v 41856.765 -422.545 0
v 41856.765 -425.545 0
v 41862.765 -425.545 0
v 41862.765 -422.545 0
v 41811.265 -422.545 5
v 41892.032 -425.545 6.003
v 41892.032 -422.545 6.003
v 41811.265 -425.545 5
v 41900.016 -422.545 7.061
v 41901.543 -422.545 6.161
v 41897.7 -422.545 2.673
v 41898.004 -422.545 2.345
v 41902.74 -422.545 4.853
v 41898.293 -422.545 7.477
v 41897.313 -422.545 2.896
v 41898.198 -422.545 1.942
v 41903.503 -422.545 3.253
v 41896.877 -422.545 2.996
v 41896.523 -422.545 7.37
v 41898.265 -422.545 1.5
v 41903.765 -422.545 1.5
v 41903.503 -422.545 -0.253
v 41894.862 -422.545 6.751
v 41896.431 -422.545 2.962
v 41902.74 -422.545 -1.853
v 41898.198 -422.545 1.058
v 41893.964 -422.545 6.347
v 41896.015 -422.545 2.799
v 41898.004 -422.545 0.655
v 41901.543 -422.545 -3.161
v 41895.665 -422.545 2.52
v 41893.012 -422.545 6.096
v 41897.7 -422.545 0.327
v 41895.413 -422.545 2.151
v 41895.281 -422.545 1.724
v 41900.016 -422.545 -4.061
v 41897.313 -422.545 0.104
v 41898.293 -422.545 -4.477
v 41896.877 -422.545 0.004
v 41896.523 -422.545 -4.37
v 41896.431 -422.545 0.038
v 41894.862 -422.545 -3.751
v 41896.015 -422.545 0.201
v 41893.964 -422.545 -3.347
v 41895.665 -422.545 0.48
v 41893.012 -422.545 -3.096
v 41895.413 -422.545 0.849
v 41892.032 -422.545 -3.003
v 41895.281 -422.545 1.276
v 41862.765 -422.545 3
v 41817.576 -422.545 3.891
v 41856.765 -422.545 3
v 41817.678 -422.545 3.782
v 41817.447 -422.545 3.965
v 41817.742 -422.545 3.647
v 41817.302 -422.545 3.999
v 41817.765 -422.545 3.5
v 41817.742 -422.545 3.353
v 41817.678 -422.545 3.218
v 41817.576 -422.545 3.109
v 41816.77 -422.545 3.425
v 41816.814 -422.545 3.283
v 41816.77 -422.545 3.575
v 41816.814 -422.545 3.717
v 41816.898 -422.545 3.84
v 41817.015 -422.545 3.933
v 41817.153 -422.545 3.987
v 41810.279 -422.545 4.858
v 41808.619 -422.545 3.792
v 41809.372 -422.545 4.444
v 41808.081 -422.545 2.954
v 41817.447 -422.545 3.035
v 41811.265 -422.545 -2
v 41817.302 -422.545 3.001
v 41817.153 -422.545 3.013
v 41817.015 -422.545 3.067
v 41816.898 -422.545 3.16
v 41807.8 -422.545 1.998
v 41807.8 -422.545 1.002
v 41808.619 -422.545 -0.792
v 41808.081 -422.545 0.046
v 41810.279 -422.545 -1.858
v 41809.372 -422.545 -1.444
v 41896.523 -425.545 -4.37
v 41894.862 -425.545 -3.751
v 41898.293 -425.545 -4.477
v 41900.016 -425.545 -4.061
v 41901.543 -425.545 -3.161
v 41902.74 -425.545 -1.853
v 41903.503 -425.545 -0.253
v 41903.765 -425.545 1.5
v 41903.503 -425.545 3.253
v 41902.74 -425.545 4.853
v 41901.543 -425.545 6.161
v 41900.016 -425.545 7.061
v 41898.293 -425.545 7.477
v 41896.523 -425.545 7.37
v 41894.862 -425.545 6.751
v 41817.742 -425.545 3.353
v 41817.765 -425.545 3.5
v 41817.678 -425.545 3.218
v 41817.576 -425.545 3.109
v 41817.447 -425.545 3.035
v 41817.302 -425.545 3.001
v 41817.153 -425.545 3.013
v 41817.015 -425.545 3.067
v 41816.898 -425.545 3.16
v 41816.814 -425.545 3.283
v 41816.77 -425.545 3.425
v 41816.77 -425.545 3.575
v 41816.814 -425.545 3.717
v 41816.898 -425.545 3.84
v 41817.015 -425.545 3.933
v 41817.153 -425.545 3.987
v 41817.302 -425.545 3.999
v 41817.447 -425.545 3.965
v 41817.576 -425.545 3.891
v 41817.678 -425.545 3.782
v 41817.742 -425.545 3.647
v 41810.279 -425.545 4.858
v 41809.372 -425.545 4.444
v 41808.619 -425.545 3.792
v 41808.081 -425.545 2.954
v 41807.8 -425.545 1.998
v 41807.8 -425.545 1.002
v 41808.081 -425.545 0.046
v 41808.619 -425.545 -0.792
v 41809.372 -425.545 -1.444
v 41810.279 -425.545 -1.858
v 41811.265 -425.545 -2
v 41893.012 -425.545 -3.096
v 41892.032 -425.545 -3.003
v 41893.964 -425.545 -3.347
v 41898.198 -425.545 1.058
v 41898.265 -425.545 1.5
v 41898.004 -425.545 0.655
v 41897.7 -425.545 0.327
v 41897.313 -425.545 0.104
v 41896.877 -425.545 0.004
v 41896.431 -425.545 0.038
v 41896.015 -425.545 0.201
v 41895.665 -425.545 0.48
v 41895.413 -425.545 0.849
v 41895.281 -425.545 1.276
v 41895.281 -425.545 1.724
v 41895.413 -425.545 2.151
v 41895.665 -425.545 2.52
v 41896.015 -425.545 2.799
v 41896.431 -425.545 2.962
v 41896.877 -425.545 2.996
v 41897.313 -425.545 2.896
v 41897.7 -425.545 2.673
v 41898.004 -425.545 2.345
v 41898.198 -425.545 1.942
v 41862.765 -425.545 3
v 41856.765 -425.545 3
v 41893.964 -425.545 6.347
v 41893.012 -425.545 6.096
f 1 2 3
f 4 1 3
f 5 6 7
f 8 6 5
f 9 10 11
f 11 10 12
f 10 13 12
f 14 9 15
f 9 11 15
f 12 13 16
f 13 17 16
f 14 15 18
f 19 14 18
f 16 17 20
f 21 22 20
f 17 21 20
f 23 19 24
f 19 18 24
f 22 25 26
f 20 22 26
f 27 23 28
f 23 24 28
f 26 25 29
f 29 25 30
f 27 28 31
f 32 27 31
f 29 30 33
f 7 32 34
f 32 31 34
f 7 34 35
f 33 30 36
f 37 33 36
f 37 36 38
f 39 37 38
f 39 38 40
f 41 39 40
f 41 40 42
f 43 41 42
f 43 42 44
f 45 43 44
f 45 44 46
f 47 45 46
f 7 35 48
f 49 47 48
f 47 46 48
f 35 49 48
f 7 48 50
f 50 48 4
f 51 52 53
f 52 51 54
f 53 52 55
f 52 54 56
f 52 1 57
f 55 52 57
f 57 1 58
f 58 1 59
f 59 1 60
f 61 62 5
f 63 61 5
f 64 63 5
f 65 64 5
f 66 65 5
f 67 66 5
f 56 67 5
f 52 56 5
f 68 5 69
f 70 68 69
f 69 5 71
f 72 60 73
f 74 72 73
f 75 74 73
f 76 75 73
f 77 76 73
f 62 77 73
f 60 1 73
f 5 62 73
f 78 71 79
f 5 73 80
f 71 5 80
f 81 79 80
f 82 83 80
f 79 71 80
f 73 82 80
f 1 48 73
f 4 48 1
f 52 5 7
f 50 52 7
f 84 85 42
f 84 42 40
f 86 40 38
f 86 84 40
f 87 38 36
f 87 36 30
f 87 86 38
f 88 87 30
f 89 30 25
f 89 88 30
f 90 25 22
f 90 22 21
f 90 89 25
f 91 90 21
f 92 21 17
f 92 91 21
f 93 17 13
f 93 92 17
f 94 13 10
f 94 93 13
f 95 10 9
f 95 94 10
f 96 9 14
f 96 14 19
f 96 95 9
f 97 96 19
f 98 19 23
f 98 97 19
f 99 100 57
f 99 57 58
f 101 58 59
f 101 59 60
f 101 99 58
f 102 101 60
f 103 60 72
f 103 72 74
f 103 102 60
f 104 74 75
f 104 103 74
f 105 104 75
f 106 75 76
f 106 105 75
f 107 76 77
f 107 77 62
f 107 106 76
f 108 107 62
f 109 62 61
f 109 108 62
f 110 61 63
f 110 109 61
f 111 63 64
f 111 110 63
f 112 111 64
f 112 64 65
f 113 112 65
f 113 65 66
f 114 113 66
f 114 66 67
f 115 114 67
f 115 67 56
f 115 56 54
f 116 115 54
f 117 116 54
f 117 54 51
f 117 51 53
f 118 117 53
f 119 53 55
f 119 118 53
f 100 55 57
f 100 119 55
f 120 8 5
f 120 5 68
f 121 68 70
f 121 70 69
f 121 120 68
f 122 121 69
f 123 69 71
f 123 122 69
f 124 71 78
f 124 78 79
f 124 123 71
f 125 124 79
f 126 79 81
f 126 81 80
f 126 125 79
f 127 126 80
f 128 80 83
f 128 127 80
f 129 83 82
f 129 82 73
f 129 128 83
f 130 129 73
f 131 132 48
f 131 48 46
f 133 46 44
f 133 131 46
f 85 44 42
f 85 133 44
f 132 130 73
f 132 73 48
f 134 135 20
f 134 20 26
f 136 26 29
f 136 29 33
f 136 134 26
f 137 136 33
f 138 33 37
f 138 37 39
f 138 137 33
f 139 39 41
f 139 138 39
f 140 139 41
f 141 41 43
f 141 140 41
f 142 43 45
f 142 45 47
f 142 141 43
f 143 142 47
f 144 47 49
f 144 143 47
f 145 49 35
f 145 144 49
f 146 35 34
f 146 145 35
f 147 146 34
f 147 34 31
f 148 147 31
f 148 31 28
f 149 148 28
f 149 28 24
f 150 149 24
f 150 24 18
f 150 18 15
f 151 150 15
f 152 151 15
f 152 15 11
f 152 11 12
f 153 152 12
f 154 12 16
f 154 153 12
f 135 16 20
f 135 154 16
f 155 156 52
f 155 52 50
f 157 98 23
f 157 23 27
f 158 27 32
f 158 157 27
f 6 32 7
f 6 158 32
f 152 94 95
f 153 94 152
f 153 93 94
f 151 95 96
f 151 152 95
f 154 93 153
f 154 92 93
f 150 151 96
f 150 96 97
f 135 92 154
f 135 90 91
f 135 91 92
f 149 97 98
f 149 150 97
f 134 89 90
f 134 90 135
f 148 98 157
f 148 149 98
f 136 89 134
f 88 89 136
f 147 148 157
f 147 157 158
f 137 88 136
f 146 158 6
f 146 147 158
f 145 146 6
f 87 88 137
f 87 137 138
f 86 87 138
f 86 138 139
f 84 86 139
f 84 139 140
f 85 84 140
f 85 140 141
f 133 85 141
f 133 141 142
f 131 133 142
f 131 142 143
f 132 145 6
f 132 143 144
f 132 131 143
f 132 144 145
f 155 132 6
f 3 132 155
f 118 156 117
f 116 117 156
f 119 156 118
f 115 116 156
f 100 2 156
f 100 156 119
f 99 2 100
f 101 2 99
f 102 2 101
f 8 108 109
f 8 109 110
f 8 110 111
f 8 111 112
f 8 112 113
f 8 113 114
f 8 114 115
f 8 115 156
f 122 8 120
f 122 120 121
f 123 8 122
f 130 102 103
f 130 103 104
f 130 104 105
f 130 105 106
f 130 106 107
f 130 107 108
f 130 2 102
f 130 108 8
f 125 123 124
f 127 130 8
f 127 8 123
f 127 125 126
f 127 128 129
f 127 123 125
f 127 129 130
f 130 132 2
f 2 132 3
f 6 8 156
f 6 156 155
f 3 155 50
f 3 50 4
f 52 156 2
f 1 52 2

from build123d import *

# Parameters (mm, degrees)
CROQUIS1_R                 = 0.5
CROQUIS1_R_2               = 1.5
CROQUIS1_W                 = 6
CROQUIS1_H                 = 3
SALIENTE_EXTRUIR1_DEPTH    = 3
S_LIDO_MOVER_COPIAR1_ANGLE = 90


with BuildPart() as part:
    # Croquis1 → Saliente-Extruir1 (new body)
    with BuildSketch(Plane.XY):
        with BuildLine():
            Line((41811.264601562, -420.544949858), (41892.031527809, -419.541772165))
            ThreePointArc((41892.031527809, -419.541772165), (41893.493281322, -419.343004838), (41894.86235293, -418.793573574))
            ThreePointArc((41894.86235293, -418.793573574), (41903.764601562, -424.044949858), (41894.86235293, -429.296326142))
            ThreePointArc((41894.86235293, -429.296326142), (41893.493281322, -428.746894878), (41892.031527809, -428.548127552))
            Line((41892.031527809, -428.548127552), (41811.264601555, -427.544949858))
            ThreePointArc((41811.264601555, -427.544949858), (41807.764601562, -424.044949855), (41811.264601562, -420.544949858))
        make_face()
        with Locations((41817.264601562, -426.044949857)):
            Circle(CROQUIS1_R, mode=Mode.SUBTRACT)
        with Locations((41896.764601562, -424.044949858)):
            Circle(CROQUIS1_R_2, mode=Mode.SUBTRACT)
        with Locations((41859.764601562, -424.044949858)):
            Rectangle(CROQUIS1_W, CROQUIS1_H, mode=Mode.SUBTRACT)
    extrude(amount=SALIENTE_EXTRUIR1_DEPTH)


with BuildPart() as part_1:
    # Sólido-Mover/Copiar1: moved
    add(part.part.rotate(Axis((0, -424.044949858, 1.5), (-1, 0, 0)), S_LIDO_MOVER_COPIAR1_ANGLE))


solid = part_1.part
